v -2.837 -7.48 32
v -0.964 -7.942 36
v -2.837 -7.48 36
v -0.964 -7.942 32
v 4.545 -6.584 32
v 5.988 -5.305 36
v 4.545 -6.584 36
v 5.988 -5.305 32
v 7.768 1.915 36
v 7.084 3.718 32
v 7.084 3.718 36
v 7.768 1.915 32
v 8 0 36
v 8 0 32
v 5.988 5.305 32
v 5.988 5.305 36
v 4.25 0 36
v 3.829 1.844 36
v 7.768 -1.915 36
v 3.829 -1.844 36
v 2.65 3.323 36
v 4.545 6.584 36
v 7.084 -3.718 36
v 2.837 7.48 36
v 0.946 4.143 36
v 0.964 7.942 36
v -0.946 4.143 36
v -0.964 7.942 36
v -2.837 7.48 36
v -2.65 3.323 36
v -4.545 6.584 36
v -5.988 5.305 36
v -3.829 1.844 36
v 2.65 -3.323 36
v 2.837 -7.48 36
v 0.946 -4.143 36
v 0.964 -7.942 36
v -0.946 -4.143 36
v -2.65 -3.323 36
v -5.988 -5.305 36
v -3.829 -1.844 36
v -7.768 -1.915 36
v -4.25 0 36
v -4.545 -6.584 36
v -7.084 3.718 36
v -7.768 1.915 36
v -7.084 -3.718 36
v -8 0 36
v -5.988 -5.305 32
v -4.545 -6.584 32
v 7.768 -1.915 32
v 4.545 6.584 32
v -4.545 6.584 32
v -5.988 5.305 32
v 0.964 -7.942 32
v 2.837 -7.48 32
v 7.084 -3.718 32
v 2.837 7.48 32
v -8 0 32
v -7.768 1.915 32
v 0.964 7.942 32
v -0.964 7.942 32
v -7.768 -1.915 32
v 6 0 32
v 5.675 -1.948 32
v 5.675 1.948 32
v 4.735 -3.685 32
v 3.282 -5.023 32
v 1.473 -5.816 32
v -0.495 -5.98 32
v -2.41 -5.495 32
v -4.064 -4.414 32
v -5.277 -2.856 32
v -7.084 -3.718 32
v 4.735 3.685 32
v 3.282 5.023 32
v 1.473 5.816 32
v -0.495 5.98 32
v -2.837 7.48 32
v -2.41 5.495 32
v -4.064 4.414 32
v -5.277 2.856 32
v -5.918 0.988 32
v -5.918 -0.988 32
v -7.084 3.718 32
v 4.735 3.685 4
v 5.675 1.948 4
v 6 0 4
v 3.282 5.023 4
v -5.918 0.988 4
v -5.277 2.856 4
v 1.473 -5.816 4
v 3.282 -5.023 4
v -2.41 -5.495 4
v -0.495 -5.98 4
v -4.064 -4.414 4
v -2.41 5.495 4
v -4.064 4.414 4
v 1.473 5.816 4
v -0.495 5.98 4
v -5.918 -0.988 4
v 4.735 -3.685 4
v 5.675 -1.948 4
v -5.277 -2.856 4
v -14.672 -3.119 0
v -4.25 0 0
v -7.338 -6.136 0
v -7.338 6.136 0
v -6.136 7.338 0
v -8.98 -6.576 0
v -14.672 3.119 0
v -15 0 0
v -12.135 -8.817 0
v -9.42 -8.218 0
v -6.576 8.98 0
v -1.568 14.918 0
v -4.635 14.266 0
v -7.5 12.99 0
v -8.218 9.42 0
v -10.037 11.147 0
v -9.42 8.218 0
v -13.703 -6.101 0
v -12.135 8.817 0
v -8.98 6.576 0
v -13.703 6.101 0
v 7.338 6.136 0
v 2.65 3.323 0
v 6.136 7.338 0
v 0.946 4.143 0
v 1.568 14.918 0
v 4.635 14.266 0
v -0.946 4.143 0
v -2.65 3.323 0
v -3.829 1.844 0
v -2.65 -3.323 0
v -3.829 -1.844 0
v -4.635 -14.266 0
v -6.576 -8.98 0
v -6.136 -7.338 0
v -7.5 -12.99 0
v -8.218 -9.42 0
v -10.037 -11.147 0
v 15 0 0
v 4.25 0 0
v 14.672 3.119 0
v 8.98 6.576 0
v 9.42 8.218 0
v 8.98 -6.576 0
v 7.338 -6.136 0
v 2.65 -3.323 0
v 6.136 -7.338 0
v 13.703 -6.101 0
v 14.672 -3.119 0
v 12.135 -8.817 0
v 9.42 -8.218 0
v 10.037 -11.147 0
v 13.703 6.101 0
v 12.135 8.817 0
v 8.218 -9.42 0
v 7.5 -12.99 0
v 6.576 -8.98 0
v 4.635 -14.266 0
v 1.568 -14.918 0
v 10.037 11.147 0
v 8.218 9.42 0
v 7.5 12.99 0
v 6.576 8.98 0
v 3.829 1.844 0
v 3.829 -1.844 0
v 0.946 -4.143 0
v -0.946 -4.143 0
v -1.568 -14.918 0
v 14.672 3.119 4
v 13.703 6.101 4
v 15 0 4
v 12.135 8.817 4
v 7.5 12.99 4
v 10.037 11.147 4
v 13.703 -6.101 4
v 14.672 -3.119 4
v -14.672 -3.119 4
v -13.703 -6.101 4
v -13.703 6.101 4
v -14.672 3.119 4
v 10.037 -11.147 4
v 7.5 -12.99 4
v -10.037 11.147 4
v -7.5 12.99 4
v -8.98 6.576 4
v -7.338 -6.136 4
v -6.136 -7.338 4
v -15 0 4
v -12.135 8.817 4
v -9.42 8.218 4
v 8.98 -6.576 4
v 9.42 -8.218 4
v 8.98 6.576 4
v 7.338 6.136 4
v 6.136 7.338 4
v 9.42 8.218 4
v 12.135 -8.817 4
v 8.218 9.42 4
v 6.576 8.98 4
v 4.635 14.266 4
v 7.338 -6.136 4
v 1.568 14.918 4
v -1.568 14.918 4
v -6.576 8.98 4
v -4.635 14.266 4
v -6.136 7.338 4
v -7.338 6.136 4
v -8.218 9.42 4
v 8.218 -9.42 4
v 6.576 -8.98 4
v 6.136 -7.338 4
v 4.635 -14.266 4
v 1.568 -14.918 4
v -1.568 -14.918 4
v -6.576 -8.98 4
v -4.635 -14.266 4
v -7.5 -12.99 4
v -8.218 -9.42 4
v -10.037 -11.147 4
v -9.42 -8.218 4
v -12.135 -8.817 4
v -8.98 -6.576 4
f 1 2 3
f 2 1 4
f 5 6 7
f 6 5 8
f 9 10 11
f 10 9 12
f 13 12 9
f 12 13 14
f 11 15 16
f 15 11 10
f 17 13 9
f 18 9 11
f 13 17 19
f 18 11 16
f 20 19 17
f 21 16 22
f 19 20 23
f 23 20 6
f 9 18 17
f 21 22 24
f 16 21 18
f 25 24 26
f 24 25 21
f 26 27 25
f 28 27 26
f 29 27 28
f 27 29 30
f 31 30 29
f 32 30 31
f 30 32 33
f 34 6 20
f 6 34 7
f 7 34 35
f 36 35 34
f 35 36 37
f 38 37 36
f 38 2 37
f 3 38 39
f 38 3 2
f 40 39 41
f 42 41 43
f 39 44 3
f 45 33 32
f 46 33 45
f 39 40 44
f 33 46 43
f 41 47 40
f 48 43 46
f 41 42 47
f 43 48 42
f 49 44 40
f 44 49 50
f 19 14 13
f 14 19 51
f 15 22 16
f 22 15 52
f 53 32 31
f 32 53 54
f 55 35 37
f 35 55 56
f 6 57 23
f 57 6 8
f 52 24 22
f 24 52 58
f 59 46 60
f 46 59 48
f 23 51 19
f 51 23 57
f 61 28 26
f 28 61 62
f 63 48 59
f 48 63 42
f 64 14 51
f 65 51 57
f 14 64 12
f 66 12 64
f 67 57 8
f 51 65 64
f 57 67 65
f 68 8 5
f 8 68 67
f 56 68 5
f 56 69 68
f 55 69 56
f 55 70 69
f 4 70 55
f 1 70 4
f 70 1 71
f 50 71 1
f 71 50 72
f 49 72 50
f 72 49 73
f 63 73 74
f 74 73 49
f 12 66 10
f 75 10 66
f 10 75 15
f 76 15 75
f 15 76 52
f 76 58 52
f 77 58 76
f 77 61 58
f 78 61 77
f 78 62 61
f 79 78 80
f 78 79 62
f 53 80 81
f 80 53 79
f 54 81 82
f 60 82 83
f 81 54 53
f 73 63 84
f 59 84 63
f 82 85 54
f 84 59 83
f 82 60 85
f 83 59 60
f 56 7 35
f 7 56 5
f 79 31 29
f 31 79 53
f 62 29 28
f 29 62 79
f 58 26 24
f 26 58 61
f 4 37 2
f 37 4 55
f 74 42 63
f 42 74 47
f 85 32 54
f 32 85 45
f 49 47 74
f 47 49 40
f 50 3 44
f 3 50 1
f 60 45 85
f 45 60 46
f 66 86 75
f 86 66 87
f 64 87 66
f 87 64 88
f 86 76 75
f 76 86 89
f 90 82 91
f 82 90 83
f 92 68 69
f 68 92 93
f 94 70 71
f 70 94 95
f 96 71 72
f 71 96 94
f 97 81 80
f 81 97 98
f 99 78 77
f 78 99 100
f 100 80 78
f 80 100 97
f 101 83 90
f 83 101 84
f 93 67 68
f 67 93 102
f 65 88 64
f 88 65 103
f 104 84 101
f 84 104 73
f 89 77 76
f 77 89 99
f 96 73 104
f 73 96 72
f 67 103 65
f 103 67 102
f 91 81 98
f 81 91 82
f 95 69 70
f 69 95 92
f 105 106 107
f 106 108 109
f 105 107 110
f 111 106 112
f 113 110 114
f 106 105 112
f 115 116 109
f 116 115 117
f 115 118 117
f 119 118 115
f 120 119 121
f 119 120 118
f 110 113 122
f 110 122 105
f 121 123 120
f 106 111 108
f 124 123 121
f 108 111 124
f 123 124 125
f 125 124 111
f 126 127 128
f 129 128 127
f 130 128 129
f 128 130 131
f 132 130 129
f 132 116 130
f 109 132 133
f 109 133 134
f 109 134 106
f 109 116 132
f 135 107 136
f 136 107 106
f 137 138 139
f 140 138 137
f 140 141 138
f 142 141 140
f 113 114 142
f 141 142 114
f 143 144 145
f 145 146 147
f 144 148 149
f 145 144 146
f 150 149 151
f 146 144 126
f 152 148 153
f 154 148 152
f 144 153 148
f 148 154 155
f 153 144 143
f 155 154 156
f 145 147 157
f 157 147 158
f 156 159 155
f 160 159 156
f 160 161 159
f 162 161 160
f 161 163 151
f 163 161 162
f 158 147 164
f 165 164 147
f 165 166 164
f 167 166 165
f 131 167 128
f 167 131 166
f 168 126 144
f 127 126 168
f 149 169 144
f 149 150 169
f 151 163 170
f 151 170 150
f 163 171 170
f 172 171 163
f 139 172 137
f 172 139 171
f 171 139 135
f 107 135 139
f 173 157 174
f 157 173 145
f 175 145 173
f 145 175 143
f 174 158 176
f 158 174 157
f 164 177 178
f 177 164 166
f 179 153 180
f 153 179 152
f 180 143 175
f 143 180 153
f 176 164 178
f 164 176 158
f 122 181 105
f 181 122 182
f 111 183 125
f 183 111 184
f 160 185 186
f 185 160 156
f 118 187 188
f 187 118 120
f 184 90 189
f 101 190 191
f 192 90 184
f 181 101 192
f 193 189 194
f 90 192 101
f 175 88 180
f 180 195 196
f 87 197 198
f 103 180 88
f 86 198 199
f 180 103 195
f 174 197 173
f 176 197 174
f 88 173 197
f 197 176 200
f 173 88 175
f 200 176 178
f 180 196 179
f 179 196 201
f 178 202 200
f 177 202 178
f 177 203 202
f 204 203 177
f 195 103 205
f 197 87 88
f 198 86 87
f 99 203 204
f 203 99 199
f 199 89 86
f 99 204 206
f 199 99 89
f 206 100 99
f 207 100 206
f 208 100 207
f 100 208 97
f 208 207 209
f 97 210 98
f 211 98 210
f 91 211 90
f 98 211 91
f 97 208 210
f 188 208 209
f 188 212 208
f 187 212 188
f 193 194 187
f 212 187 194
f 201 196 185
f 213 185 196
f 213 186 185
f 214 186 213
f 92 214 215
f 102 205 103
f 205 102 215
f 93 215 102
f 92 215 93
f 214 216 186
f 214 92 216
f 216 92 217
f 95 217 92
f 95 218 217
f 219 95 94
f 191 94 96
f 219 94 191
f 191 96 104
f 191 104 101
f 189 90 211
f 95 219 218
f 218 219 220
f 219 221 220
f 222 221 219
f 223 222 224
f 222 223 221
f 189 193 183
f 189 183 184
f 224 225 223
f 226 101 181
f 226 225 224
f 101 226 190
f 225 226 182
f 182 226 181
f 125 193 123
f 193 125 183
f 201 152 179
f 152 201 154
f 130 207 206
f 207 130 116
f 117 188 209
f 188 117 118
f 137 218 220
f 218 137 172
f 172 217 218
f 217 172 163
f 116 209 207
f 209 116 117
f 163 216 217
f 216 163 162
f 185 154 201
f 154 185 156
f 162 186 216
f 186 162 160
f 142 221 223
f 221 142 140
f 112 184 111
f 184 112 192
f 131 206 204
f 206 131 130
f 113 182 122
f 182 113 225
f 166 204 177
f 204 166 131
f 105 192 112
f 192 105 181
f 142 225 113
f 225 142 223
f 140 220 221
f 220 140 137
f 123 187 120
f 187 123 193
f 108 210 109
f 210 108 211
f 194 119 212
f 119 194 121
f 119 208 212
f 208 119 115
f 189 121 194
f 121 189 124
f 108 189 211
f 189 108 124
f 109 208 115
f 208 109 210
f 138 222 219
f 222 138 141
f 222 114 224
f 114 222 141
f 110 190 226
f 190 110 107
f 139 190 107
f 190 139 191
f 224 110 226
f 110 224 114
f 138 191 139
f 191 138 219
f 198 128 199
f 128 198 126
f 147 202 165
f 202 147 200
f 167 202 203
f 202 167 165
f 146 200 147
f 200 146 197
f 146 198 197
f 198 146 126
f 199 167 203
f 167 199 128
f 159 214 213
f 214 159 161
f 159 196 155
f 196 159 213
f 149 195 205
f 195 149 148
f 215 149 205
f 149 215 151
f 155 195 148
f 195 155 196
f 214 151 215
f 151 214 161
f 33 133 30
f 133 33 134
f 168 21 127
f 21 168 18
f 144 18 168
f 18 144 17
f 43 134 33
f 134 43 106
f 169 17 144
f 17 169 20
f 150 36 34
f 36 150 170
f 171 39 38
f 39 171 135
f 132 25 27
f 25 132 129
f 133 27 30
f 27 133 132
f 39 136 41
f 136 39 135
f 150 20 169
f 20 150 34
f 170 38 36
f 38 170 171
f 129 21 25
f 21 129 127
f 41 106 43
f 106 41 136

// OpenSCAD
// file: lib/mirror.scad
// MIT License
// From https://github.com/lostapathy/openscad-libs/blob/master/openscad_util/layout/layout.scad


module mirror_x() {
  children();
    mirror([1, 0, 0]) children();
}

module mirror_y() {
  children();
    mirror([0, 1, 0]) children();
}

module mirror_z() {
  children();
    mirror([0, 0, 1]) children();
}

module mirror_xy() {
  mirror_x() mirror_y() children();
}

module mirror_xz() {
  mirror_x() mirror_z() children();
}

module mirror_yz() {
  mirror_y() mirror_z() children();
}

module mirror_xyz() {
  mirror_x() mirror_y() mirror_z() children();
}

module repeat_with_offset(offset, copies=1) {
  for(i = [0:copies-1]) {
      translate(offset * i)
            children();
  }
}
// file: constants.scad
epsilon=0.1;  // epislon value for OpenSCAD reasons :)
inch = 25.4; // convert imperial units
// main file
include <constants.scad>
use <lib/mirror.scad>

module anti_backlash_nut(screw_size) {
  color("#b5a642") {
    difference() {
      union() {
        translate([0,0,32]) cylinder(d=16, h=4);
        cylinder(d=12, h=36);
        cylinder(d=30, h=4);
      }

      // mount bolt pattern
      // FIXME: use a proper hole rather than cylinder
      mirror_xy() {
        rotate([0,0, 45])
          translate([0, 11, -1])
            cylinder(d=3.4, h=10);
      }

      translate([0,0,-epsilon]) cylinder(d=8+5*epsilon, h=36+2*epsilon);
    }
  }
}

anti_backlash_nut(8);
